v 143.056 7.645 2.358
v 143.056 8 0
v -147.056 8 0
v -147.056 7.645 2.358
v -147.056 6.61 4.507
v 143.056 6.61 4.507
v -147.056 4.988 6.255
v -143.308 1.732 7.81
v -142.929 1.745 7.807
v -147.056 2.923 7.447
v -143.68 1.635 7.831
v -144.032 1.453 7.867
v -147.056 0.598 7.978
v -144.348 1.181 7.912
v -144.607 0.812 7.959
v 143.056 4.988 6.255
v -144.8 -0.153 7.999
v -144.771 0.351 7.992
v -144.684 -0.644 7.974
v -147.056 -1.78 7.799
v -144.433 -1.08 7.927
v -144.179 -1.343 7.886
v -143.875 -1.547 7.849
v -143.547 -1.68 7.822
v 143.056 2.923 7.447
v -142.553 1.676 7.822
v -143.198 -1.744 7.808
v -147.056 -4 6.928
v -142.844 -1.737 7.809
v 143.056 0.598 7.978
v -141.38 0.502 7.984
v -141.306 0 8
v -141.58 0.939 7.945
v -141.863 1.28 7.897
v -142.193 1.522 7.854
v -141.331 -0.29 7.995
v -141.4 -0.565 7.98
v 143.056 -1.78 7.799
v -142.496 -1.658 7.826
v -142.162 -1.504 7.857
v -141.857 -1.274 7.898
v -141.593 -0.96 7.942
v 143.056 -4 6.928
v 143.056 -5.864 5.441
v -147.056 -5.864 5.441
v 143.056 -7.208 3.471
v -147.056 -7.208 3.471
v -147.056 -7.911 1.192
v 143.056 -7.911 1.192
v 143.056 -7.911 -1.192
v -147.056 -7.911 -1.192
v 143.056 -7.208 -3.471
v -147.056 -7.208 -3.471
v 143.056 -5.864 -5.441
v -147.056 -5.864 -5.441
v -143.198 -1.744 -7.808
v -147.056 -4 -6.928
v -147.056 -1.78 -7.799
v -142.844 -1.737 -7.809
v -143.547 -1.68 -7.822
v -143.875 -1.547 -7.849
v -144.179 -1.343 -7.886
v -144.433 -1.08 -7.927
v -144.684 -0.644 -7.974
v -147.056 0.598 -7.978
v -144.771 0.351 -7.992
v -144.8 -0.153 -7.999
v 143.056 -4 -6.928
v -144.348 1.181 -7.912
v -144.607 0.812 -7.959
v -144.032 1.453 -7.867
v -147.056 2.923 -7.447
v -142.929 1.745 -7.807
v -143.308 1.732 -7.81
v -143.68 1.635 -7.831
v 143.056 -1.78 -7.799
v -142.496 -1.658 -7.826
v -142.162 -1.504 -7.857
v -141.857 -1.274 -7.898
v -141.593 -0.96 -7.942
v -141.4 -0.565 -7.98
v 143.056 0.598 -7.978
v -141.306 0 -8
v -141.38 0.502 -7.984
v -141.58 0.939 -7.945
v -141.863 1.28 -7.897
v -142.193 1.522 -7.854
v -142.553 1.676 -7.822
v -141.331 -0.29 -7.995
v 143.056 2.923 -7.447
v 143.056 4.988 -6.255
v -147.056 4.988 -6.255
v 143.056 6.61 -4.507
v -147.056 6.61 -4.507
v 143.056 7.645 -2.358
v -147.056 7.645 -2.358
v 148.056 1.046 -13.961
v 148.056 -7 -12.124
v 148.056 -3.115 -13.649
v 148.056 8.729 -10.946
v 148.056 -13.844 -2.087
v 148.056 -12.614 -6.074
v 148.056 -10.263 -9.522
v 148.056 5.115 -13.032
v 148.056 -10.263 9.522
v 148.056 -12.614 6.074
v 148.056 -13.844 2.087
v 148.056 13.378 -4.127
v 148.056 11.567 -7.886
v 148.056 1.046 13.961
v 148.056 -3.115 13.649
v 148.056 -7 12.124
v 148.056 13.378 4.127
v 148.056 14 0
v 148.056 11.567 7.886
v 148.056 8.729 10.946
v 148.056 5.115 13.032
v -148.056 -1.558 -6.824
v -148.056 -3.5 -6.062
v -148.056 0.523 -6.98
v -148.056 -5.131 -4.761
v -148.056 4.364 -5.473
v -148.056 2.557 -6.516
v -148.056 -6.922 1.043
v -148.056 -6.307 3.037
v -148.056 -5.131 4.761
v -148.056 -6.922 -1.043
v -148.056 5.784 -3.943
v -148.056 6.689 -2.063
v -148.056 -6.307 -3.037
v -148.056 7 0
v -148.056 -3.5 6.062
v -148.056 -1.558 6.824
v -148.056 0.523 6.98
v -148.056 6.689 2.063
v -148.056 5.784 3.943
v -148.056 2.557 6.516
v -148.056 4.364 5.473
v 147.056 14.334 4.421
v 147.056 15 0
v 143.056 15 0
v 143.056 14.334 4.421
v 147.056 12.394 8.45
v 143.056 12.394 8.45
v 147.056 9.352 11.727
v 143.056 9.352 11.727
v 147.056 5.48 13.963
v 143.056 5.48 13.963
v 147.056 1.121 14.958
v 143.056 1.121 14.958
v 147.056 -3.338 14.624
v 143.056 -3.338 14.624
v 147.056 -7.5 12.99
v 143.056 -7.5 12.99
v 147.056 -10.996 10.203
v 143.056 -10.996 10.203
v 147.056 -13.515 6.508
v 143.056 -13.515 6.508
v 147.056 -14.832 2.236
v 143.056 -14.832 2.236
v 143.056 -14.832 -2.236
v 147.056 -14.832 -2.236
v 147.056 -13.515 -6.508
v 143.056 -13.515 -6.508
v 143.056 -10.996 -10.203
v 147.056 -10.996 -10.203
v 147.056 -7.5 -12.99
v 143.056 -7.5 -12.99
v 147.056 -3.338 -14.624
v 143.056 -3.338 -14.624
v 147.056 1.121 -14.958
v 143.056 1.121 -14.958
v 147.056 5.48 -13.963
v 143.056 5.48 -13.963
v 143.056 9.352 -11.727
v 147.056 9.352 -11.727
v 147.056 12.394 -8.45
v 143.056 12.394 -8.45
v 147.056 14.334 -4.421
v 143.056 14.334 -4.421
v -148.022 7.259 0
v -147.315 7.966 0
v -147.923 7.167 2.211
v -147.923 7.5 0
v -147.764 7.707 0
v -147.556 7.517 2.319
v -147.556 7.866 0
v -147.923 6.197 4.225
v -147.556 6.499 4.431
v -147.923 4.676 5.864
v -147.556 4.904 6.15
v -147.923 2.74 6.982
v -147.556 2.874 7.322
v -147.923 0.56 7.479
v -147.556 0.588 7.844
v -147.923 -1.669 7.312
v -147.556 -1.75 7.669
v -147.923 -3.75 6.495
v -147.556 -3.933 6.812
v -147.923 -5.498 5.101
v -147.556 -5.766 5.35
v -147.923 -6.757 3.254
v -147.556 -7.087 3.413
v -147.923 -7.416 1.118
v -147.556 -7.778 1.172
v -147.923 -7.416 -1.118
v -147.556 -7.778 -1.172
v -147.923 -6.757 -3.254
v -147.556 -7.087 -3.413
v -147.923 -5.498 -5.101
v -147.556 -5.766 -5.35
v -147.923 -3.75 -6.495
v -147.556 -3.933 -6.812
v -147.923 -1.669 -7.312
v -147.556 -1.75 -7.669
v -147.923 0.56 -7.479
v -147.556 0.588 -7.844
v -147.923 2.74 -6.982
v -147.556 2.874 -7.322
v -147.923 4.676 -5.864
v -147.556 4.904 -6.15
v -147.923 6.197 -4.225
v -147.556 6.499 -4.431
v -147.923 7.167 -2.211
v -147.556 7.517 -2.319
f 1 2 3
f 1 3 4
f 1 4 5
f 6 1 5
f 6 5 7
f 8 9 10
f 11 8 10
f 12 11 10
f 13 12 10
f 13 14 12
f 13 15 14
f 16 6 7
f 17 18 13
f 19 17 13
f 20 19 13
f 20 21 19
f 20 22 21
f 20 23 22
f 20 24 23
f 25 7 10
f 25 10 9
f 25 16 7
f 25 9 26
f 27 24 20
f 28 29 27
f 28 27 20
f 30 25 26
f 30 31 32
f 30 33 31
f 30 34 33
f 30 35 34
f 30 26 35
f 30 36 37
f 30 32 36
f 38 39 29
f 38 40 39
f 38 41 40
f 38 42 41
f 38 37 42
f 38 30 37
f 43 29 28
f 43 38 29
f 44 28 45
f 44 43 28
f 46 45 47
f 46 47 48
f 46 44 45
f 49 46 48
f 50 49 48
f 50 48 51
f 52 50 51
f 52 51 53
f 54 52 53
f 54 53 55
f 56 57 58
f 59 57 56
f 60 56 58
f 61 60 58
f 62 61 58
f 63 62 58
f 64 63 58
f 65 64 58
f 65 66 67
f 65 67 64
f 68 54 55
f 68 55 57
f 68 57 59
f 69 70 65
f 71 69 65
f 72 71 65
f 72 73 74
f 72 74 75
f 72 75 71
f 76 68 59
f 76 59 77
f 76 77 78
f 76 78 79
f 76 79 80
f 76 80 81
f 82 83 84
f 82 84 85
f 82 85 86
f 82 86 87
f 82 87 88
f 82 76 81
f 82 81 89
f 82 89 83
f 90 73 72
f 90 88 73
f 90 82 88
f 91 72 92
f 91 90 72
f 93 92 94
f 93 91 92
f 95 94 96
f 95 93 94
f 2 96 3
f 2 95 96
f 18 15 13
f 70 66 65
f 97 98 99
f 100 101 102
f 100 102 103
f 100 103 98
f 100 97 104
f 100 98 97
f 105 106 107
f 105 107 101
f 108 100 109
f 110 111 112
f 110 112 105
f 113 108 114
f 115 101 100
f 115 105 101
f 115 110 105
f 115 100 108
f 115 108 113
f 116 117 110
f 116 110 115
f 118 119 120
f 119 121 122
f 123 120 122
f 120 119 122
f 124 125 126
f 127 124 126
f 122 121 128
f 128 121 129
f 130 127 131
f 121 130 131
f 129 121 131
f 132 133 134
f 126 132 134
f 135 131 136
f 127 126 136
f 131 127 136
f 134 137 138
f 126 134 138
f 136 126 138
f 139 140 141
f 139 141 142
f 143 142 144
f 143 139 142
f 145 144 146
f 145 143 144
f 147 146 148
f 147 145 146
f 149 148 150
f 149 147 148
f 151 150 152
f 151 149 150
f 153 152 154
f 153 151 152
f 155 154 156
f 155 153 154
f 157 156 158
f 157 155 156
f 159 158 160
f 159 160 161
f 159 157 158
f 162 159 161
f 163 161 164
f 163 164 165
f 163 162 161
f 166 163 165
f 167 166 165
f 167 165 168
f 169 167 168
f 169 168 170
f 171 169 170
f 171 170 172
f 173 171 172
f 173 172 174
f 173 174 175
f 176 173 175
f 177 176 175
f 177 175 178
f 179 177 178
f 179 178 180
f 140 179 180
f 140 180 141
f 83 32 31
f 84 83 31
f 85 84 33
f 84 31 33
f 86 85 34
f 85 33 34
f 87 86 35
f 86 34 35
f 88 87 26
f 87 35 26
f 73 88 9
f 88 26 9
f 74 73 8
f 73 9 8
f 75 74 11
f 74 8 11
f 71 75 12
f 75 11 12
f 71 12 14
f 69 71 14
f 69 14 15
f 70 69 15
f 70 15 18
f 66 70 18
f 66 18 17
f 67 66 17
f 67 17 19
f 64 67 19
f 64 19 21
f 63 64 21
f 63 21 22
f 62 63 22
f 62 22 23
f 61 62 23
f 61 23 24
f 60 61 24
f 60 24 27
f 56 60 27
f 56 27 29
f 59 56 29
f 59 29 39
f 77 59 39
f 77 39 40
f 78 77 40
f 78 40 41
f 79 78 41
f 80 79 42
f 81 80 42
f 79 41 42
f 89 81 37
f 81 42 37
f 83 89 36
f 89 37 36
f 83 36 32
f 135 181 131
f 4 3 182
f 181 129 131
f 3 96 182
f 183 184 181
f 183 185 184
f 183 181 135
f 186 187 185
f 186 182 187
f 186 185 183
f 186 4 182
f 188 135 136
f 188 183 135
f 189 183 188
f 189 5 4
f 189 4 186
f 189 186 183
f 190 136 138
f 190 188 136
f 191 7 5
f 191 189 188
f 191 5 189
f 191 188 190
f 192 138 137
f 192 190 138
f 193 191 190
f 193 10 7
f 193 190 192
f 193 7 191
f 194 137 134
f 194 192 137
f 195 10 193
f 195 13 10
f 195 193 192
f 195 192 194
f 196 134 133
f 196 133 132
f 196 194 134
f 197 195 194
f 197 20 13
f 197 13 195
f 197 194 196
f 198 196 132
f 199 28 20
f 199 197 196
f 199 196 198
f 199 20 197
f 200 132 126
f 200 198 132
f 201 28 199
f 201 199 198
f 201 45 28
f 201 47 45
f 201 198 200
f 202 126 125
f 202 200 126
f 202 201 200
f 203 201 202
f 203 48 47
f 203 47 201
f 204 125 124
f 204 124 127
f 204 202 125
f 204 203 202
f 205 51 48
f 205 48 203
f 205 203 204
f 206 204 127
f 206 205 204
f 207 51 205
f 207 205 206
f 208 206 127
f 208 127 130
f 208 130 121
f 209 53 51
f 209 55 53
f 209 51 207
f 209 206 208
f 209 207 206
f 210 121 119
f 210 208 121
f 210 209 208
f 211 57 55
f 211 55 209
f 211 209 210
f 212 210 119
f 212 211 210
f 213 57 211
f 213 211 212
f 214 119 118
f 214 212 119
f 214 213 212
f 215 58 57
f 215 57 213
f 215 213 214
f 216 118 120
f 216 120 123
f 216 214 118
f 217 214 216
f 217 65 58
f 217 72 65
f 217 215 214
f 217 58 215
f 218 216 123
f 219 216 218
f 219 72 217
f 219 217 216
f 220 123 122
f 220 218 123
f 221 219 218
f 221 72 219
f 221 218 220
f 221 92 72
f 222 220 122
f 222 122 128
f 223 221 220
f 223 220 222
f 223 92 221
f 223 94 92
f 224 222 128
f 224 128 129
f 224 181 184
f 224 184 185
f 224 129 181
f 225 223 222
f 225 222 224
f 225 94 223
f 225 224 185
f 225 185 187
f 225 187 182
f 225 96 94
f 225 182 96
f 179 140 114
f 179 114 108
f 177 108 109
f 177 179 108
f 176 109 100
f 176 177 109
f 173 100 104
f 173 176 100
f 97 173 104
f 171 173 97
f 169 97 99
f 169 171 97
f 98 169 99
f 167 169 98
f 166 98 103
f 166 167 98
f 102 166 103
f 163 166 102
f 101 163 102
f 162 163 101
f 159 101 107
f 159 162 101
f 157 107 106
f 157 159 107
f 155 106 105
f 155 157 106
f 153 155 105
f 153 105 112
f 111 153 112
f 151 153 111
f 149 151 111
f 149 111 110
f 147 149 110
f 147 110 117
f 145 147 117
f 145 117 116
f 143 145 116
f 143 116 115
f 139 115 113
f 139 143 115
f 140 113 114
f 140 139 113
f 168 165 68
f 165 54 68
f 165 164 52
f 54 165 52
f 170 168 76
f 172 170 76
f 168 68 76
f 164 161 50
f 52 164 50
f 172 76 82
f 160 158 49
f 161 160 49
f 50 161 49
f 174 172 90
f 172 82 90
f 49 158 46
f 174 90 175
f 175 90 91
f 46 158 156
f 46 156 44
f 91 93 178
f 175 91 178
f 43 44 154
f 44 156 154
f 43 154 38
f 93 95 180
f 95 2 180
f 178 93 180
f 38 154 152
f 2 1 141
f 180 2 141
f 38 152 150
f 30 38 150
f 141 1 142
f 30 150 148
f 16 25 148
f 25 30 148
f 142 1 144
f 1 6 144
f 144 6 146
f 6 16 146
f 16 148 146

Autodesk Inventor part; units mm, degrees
ref_plane "YZ Plane" through (0, 0, 0) normal (1, 0, 0) x (0, 1, 0)
ref_plane "XZ Plane" through (0, 0, 0) normal (0, 1, 0) x (-1, 0, 0)
ref_plane "XY Plane" through (0, 0, 0) normal (0, 0, 1) x (1, 0, 0)
sketch "Sketch1" plane through (0, 0, 0) normal (0, 0, 1) x (1, 0, 0)
  line L0 (-148.0565, 0) -> (148.0565, 0)
  line L1 (-148.0565, 0) -> (-148.0565, 8)
  line L2 (-148.0565, 8) -> (143.0565, 8)
  line L3 (143.0565, 8) -> (143.0565, 15)
  line L4 (143.0565, 15) -> (148.0565, 15)
  line L5 (148.0565, 15) -> (148.0565, 0)
  circle A0 centre (-143.0565, 0) radius 1.75
  point P0 (0, 0)
  point P1 (0, 0)
  point P2 (143.0565, 8.25)
  dimension "d0" = 296.113
  dimension "d1" = 16
  dimension "d2" = 5
  dimension "d3" = 30
  dimension "d8" = 3.5
  dimension "d9" = 5
  dimension "d12" = 0.25
revolve "Revolution1" add sketch "Sketch1" angle 360 about axis through (-148.0565, 0, 0) along (1, 0, 0) picked at (-142.9862, 0.5791) contours A0 L0 L1 L2 L3 L4 L5 | L0 A0
fillet "Fillet1" radius 1 1 edges at (-148.0565, -8, 0)
chamfer "Chamfer1" distance 1 angle 45 3 edges at (148.0565, -15, 0) (-147.0565, -8, 0) (-148.0565, -7, 0)
extrude "Extrusion2" cut sketch "Sketch1" against normal through all both and the other way through all contours A0 L0 | L0 A0
properties part number "PWTR-0137" material "Stainless Steel"
